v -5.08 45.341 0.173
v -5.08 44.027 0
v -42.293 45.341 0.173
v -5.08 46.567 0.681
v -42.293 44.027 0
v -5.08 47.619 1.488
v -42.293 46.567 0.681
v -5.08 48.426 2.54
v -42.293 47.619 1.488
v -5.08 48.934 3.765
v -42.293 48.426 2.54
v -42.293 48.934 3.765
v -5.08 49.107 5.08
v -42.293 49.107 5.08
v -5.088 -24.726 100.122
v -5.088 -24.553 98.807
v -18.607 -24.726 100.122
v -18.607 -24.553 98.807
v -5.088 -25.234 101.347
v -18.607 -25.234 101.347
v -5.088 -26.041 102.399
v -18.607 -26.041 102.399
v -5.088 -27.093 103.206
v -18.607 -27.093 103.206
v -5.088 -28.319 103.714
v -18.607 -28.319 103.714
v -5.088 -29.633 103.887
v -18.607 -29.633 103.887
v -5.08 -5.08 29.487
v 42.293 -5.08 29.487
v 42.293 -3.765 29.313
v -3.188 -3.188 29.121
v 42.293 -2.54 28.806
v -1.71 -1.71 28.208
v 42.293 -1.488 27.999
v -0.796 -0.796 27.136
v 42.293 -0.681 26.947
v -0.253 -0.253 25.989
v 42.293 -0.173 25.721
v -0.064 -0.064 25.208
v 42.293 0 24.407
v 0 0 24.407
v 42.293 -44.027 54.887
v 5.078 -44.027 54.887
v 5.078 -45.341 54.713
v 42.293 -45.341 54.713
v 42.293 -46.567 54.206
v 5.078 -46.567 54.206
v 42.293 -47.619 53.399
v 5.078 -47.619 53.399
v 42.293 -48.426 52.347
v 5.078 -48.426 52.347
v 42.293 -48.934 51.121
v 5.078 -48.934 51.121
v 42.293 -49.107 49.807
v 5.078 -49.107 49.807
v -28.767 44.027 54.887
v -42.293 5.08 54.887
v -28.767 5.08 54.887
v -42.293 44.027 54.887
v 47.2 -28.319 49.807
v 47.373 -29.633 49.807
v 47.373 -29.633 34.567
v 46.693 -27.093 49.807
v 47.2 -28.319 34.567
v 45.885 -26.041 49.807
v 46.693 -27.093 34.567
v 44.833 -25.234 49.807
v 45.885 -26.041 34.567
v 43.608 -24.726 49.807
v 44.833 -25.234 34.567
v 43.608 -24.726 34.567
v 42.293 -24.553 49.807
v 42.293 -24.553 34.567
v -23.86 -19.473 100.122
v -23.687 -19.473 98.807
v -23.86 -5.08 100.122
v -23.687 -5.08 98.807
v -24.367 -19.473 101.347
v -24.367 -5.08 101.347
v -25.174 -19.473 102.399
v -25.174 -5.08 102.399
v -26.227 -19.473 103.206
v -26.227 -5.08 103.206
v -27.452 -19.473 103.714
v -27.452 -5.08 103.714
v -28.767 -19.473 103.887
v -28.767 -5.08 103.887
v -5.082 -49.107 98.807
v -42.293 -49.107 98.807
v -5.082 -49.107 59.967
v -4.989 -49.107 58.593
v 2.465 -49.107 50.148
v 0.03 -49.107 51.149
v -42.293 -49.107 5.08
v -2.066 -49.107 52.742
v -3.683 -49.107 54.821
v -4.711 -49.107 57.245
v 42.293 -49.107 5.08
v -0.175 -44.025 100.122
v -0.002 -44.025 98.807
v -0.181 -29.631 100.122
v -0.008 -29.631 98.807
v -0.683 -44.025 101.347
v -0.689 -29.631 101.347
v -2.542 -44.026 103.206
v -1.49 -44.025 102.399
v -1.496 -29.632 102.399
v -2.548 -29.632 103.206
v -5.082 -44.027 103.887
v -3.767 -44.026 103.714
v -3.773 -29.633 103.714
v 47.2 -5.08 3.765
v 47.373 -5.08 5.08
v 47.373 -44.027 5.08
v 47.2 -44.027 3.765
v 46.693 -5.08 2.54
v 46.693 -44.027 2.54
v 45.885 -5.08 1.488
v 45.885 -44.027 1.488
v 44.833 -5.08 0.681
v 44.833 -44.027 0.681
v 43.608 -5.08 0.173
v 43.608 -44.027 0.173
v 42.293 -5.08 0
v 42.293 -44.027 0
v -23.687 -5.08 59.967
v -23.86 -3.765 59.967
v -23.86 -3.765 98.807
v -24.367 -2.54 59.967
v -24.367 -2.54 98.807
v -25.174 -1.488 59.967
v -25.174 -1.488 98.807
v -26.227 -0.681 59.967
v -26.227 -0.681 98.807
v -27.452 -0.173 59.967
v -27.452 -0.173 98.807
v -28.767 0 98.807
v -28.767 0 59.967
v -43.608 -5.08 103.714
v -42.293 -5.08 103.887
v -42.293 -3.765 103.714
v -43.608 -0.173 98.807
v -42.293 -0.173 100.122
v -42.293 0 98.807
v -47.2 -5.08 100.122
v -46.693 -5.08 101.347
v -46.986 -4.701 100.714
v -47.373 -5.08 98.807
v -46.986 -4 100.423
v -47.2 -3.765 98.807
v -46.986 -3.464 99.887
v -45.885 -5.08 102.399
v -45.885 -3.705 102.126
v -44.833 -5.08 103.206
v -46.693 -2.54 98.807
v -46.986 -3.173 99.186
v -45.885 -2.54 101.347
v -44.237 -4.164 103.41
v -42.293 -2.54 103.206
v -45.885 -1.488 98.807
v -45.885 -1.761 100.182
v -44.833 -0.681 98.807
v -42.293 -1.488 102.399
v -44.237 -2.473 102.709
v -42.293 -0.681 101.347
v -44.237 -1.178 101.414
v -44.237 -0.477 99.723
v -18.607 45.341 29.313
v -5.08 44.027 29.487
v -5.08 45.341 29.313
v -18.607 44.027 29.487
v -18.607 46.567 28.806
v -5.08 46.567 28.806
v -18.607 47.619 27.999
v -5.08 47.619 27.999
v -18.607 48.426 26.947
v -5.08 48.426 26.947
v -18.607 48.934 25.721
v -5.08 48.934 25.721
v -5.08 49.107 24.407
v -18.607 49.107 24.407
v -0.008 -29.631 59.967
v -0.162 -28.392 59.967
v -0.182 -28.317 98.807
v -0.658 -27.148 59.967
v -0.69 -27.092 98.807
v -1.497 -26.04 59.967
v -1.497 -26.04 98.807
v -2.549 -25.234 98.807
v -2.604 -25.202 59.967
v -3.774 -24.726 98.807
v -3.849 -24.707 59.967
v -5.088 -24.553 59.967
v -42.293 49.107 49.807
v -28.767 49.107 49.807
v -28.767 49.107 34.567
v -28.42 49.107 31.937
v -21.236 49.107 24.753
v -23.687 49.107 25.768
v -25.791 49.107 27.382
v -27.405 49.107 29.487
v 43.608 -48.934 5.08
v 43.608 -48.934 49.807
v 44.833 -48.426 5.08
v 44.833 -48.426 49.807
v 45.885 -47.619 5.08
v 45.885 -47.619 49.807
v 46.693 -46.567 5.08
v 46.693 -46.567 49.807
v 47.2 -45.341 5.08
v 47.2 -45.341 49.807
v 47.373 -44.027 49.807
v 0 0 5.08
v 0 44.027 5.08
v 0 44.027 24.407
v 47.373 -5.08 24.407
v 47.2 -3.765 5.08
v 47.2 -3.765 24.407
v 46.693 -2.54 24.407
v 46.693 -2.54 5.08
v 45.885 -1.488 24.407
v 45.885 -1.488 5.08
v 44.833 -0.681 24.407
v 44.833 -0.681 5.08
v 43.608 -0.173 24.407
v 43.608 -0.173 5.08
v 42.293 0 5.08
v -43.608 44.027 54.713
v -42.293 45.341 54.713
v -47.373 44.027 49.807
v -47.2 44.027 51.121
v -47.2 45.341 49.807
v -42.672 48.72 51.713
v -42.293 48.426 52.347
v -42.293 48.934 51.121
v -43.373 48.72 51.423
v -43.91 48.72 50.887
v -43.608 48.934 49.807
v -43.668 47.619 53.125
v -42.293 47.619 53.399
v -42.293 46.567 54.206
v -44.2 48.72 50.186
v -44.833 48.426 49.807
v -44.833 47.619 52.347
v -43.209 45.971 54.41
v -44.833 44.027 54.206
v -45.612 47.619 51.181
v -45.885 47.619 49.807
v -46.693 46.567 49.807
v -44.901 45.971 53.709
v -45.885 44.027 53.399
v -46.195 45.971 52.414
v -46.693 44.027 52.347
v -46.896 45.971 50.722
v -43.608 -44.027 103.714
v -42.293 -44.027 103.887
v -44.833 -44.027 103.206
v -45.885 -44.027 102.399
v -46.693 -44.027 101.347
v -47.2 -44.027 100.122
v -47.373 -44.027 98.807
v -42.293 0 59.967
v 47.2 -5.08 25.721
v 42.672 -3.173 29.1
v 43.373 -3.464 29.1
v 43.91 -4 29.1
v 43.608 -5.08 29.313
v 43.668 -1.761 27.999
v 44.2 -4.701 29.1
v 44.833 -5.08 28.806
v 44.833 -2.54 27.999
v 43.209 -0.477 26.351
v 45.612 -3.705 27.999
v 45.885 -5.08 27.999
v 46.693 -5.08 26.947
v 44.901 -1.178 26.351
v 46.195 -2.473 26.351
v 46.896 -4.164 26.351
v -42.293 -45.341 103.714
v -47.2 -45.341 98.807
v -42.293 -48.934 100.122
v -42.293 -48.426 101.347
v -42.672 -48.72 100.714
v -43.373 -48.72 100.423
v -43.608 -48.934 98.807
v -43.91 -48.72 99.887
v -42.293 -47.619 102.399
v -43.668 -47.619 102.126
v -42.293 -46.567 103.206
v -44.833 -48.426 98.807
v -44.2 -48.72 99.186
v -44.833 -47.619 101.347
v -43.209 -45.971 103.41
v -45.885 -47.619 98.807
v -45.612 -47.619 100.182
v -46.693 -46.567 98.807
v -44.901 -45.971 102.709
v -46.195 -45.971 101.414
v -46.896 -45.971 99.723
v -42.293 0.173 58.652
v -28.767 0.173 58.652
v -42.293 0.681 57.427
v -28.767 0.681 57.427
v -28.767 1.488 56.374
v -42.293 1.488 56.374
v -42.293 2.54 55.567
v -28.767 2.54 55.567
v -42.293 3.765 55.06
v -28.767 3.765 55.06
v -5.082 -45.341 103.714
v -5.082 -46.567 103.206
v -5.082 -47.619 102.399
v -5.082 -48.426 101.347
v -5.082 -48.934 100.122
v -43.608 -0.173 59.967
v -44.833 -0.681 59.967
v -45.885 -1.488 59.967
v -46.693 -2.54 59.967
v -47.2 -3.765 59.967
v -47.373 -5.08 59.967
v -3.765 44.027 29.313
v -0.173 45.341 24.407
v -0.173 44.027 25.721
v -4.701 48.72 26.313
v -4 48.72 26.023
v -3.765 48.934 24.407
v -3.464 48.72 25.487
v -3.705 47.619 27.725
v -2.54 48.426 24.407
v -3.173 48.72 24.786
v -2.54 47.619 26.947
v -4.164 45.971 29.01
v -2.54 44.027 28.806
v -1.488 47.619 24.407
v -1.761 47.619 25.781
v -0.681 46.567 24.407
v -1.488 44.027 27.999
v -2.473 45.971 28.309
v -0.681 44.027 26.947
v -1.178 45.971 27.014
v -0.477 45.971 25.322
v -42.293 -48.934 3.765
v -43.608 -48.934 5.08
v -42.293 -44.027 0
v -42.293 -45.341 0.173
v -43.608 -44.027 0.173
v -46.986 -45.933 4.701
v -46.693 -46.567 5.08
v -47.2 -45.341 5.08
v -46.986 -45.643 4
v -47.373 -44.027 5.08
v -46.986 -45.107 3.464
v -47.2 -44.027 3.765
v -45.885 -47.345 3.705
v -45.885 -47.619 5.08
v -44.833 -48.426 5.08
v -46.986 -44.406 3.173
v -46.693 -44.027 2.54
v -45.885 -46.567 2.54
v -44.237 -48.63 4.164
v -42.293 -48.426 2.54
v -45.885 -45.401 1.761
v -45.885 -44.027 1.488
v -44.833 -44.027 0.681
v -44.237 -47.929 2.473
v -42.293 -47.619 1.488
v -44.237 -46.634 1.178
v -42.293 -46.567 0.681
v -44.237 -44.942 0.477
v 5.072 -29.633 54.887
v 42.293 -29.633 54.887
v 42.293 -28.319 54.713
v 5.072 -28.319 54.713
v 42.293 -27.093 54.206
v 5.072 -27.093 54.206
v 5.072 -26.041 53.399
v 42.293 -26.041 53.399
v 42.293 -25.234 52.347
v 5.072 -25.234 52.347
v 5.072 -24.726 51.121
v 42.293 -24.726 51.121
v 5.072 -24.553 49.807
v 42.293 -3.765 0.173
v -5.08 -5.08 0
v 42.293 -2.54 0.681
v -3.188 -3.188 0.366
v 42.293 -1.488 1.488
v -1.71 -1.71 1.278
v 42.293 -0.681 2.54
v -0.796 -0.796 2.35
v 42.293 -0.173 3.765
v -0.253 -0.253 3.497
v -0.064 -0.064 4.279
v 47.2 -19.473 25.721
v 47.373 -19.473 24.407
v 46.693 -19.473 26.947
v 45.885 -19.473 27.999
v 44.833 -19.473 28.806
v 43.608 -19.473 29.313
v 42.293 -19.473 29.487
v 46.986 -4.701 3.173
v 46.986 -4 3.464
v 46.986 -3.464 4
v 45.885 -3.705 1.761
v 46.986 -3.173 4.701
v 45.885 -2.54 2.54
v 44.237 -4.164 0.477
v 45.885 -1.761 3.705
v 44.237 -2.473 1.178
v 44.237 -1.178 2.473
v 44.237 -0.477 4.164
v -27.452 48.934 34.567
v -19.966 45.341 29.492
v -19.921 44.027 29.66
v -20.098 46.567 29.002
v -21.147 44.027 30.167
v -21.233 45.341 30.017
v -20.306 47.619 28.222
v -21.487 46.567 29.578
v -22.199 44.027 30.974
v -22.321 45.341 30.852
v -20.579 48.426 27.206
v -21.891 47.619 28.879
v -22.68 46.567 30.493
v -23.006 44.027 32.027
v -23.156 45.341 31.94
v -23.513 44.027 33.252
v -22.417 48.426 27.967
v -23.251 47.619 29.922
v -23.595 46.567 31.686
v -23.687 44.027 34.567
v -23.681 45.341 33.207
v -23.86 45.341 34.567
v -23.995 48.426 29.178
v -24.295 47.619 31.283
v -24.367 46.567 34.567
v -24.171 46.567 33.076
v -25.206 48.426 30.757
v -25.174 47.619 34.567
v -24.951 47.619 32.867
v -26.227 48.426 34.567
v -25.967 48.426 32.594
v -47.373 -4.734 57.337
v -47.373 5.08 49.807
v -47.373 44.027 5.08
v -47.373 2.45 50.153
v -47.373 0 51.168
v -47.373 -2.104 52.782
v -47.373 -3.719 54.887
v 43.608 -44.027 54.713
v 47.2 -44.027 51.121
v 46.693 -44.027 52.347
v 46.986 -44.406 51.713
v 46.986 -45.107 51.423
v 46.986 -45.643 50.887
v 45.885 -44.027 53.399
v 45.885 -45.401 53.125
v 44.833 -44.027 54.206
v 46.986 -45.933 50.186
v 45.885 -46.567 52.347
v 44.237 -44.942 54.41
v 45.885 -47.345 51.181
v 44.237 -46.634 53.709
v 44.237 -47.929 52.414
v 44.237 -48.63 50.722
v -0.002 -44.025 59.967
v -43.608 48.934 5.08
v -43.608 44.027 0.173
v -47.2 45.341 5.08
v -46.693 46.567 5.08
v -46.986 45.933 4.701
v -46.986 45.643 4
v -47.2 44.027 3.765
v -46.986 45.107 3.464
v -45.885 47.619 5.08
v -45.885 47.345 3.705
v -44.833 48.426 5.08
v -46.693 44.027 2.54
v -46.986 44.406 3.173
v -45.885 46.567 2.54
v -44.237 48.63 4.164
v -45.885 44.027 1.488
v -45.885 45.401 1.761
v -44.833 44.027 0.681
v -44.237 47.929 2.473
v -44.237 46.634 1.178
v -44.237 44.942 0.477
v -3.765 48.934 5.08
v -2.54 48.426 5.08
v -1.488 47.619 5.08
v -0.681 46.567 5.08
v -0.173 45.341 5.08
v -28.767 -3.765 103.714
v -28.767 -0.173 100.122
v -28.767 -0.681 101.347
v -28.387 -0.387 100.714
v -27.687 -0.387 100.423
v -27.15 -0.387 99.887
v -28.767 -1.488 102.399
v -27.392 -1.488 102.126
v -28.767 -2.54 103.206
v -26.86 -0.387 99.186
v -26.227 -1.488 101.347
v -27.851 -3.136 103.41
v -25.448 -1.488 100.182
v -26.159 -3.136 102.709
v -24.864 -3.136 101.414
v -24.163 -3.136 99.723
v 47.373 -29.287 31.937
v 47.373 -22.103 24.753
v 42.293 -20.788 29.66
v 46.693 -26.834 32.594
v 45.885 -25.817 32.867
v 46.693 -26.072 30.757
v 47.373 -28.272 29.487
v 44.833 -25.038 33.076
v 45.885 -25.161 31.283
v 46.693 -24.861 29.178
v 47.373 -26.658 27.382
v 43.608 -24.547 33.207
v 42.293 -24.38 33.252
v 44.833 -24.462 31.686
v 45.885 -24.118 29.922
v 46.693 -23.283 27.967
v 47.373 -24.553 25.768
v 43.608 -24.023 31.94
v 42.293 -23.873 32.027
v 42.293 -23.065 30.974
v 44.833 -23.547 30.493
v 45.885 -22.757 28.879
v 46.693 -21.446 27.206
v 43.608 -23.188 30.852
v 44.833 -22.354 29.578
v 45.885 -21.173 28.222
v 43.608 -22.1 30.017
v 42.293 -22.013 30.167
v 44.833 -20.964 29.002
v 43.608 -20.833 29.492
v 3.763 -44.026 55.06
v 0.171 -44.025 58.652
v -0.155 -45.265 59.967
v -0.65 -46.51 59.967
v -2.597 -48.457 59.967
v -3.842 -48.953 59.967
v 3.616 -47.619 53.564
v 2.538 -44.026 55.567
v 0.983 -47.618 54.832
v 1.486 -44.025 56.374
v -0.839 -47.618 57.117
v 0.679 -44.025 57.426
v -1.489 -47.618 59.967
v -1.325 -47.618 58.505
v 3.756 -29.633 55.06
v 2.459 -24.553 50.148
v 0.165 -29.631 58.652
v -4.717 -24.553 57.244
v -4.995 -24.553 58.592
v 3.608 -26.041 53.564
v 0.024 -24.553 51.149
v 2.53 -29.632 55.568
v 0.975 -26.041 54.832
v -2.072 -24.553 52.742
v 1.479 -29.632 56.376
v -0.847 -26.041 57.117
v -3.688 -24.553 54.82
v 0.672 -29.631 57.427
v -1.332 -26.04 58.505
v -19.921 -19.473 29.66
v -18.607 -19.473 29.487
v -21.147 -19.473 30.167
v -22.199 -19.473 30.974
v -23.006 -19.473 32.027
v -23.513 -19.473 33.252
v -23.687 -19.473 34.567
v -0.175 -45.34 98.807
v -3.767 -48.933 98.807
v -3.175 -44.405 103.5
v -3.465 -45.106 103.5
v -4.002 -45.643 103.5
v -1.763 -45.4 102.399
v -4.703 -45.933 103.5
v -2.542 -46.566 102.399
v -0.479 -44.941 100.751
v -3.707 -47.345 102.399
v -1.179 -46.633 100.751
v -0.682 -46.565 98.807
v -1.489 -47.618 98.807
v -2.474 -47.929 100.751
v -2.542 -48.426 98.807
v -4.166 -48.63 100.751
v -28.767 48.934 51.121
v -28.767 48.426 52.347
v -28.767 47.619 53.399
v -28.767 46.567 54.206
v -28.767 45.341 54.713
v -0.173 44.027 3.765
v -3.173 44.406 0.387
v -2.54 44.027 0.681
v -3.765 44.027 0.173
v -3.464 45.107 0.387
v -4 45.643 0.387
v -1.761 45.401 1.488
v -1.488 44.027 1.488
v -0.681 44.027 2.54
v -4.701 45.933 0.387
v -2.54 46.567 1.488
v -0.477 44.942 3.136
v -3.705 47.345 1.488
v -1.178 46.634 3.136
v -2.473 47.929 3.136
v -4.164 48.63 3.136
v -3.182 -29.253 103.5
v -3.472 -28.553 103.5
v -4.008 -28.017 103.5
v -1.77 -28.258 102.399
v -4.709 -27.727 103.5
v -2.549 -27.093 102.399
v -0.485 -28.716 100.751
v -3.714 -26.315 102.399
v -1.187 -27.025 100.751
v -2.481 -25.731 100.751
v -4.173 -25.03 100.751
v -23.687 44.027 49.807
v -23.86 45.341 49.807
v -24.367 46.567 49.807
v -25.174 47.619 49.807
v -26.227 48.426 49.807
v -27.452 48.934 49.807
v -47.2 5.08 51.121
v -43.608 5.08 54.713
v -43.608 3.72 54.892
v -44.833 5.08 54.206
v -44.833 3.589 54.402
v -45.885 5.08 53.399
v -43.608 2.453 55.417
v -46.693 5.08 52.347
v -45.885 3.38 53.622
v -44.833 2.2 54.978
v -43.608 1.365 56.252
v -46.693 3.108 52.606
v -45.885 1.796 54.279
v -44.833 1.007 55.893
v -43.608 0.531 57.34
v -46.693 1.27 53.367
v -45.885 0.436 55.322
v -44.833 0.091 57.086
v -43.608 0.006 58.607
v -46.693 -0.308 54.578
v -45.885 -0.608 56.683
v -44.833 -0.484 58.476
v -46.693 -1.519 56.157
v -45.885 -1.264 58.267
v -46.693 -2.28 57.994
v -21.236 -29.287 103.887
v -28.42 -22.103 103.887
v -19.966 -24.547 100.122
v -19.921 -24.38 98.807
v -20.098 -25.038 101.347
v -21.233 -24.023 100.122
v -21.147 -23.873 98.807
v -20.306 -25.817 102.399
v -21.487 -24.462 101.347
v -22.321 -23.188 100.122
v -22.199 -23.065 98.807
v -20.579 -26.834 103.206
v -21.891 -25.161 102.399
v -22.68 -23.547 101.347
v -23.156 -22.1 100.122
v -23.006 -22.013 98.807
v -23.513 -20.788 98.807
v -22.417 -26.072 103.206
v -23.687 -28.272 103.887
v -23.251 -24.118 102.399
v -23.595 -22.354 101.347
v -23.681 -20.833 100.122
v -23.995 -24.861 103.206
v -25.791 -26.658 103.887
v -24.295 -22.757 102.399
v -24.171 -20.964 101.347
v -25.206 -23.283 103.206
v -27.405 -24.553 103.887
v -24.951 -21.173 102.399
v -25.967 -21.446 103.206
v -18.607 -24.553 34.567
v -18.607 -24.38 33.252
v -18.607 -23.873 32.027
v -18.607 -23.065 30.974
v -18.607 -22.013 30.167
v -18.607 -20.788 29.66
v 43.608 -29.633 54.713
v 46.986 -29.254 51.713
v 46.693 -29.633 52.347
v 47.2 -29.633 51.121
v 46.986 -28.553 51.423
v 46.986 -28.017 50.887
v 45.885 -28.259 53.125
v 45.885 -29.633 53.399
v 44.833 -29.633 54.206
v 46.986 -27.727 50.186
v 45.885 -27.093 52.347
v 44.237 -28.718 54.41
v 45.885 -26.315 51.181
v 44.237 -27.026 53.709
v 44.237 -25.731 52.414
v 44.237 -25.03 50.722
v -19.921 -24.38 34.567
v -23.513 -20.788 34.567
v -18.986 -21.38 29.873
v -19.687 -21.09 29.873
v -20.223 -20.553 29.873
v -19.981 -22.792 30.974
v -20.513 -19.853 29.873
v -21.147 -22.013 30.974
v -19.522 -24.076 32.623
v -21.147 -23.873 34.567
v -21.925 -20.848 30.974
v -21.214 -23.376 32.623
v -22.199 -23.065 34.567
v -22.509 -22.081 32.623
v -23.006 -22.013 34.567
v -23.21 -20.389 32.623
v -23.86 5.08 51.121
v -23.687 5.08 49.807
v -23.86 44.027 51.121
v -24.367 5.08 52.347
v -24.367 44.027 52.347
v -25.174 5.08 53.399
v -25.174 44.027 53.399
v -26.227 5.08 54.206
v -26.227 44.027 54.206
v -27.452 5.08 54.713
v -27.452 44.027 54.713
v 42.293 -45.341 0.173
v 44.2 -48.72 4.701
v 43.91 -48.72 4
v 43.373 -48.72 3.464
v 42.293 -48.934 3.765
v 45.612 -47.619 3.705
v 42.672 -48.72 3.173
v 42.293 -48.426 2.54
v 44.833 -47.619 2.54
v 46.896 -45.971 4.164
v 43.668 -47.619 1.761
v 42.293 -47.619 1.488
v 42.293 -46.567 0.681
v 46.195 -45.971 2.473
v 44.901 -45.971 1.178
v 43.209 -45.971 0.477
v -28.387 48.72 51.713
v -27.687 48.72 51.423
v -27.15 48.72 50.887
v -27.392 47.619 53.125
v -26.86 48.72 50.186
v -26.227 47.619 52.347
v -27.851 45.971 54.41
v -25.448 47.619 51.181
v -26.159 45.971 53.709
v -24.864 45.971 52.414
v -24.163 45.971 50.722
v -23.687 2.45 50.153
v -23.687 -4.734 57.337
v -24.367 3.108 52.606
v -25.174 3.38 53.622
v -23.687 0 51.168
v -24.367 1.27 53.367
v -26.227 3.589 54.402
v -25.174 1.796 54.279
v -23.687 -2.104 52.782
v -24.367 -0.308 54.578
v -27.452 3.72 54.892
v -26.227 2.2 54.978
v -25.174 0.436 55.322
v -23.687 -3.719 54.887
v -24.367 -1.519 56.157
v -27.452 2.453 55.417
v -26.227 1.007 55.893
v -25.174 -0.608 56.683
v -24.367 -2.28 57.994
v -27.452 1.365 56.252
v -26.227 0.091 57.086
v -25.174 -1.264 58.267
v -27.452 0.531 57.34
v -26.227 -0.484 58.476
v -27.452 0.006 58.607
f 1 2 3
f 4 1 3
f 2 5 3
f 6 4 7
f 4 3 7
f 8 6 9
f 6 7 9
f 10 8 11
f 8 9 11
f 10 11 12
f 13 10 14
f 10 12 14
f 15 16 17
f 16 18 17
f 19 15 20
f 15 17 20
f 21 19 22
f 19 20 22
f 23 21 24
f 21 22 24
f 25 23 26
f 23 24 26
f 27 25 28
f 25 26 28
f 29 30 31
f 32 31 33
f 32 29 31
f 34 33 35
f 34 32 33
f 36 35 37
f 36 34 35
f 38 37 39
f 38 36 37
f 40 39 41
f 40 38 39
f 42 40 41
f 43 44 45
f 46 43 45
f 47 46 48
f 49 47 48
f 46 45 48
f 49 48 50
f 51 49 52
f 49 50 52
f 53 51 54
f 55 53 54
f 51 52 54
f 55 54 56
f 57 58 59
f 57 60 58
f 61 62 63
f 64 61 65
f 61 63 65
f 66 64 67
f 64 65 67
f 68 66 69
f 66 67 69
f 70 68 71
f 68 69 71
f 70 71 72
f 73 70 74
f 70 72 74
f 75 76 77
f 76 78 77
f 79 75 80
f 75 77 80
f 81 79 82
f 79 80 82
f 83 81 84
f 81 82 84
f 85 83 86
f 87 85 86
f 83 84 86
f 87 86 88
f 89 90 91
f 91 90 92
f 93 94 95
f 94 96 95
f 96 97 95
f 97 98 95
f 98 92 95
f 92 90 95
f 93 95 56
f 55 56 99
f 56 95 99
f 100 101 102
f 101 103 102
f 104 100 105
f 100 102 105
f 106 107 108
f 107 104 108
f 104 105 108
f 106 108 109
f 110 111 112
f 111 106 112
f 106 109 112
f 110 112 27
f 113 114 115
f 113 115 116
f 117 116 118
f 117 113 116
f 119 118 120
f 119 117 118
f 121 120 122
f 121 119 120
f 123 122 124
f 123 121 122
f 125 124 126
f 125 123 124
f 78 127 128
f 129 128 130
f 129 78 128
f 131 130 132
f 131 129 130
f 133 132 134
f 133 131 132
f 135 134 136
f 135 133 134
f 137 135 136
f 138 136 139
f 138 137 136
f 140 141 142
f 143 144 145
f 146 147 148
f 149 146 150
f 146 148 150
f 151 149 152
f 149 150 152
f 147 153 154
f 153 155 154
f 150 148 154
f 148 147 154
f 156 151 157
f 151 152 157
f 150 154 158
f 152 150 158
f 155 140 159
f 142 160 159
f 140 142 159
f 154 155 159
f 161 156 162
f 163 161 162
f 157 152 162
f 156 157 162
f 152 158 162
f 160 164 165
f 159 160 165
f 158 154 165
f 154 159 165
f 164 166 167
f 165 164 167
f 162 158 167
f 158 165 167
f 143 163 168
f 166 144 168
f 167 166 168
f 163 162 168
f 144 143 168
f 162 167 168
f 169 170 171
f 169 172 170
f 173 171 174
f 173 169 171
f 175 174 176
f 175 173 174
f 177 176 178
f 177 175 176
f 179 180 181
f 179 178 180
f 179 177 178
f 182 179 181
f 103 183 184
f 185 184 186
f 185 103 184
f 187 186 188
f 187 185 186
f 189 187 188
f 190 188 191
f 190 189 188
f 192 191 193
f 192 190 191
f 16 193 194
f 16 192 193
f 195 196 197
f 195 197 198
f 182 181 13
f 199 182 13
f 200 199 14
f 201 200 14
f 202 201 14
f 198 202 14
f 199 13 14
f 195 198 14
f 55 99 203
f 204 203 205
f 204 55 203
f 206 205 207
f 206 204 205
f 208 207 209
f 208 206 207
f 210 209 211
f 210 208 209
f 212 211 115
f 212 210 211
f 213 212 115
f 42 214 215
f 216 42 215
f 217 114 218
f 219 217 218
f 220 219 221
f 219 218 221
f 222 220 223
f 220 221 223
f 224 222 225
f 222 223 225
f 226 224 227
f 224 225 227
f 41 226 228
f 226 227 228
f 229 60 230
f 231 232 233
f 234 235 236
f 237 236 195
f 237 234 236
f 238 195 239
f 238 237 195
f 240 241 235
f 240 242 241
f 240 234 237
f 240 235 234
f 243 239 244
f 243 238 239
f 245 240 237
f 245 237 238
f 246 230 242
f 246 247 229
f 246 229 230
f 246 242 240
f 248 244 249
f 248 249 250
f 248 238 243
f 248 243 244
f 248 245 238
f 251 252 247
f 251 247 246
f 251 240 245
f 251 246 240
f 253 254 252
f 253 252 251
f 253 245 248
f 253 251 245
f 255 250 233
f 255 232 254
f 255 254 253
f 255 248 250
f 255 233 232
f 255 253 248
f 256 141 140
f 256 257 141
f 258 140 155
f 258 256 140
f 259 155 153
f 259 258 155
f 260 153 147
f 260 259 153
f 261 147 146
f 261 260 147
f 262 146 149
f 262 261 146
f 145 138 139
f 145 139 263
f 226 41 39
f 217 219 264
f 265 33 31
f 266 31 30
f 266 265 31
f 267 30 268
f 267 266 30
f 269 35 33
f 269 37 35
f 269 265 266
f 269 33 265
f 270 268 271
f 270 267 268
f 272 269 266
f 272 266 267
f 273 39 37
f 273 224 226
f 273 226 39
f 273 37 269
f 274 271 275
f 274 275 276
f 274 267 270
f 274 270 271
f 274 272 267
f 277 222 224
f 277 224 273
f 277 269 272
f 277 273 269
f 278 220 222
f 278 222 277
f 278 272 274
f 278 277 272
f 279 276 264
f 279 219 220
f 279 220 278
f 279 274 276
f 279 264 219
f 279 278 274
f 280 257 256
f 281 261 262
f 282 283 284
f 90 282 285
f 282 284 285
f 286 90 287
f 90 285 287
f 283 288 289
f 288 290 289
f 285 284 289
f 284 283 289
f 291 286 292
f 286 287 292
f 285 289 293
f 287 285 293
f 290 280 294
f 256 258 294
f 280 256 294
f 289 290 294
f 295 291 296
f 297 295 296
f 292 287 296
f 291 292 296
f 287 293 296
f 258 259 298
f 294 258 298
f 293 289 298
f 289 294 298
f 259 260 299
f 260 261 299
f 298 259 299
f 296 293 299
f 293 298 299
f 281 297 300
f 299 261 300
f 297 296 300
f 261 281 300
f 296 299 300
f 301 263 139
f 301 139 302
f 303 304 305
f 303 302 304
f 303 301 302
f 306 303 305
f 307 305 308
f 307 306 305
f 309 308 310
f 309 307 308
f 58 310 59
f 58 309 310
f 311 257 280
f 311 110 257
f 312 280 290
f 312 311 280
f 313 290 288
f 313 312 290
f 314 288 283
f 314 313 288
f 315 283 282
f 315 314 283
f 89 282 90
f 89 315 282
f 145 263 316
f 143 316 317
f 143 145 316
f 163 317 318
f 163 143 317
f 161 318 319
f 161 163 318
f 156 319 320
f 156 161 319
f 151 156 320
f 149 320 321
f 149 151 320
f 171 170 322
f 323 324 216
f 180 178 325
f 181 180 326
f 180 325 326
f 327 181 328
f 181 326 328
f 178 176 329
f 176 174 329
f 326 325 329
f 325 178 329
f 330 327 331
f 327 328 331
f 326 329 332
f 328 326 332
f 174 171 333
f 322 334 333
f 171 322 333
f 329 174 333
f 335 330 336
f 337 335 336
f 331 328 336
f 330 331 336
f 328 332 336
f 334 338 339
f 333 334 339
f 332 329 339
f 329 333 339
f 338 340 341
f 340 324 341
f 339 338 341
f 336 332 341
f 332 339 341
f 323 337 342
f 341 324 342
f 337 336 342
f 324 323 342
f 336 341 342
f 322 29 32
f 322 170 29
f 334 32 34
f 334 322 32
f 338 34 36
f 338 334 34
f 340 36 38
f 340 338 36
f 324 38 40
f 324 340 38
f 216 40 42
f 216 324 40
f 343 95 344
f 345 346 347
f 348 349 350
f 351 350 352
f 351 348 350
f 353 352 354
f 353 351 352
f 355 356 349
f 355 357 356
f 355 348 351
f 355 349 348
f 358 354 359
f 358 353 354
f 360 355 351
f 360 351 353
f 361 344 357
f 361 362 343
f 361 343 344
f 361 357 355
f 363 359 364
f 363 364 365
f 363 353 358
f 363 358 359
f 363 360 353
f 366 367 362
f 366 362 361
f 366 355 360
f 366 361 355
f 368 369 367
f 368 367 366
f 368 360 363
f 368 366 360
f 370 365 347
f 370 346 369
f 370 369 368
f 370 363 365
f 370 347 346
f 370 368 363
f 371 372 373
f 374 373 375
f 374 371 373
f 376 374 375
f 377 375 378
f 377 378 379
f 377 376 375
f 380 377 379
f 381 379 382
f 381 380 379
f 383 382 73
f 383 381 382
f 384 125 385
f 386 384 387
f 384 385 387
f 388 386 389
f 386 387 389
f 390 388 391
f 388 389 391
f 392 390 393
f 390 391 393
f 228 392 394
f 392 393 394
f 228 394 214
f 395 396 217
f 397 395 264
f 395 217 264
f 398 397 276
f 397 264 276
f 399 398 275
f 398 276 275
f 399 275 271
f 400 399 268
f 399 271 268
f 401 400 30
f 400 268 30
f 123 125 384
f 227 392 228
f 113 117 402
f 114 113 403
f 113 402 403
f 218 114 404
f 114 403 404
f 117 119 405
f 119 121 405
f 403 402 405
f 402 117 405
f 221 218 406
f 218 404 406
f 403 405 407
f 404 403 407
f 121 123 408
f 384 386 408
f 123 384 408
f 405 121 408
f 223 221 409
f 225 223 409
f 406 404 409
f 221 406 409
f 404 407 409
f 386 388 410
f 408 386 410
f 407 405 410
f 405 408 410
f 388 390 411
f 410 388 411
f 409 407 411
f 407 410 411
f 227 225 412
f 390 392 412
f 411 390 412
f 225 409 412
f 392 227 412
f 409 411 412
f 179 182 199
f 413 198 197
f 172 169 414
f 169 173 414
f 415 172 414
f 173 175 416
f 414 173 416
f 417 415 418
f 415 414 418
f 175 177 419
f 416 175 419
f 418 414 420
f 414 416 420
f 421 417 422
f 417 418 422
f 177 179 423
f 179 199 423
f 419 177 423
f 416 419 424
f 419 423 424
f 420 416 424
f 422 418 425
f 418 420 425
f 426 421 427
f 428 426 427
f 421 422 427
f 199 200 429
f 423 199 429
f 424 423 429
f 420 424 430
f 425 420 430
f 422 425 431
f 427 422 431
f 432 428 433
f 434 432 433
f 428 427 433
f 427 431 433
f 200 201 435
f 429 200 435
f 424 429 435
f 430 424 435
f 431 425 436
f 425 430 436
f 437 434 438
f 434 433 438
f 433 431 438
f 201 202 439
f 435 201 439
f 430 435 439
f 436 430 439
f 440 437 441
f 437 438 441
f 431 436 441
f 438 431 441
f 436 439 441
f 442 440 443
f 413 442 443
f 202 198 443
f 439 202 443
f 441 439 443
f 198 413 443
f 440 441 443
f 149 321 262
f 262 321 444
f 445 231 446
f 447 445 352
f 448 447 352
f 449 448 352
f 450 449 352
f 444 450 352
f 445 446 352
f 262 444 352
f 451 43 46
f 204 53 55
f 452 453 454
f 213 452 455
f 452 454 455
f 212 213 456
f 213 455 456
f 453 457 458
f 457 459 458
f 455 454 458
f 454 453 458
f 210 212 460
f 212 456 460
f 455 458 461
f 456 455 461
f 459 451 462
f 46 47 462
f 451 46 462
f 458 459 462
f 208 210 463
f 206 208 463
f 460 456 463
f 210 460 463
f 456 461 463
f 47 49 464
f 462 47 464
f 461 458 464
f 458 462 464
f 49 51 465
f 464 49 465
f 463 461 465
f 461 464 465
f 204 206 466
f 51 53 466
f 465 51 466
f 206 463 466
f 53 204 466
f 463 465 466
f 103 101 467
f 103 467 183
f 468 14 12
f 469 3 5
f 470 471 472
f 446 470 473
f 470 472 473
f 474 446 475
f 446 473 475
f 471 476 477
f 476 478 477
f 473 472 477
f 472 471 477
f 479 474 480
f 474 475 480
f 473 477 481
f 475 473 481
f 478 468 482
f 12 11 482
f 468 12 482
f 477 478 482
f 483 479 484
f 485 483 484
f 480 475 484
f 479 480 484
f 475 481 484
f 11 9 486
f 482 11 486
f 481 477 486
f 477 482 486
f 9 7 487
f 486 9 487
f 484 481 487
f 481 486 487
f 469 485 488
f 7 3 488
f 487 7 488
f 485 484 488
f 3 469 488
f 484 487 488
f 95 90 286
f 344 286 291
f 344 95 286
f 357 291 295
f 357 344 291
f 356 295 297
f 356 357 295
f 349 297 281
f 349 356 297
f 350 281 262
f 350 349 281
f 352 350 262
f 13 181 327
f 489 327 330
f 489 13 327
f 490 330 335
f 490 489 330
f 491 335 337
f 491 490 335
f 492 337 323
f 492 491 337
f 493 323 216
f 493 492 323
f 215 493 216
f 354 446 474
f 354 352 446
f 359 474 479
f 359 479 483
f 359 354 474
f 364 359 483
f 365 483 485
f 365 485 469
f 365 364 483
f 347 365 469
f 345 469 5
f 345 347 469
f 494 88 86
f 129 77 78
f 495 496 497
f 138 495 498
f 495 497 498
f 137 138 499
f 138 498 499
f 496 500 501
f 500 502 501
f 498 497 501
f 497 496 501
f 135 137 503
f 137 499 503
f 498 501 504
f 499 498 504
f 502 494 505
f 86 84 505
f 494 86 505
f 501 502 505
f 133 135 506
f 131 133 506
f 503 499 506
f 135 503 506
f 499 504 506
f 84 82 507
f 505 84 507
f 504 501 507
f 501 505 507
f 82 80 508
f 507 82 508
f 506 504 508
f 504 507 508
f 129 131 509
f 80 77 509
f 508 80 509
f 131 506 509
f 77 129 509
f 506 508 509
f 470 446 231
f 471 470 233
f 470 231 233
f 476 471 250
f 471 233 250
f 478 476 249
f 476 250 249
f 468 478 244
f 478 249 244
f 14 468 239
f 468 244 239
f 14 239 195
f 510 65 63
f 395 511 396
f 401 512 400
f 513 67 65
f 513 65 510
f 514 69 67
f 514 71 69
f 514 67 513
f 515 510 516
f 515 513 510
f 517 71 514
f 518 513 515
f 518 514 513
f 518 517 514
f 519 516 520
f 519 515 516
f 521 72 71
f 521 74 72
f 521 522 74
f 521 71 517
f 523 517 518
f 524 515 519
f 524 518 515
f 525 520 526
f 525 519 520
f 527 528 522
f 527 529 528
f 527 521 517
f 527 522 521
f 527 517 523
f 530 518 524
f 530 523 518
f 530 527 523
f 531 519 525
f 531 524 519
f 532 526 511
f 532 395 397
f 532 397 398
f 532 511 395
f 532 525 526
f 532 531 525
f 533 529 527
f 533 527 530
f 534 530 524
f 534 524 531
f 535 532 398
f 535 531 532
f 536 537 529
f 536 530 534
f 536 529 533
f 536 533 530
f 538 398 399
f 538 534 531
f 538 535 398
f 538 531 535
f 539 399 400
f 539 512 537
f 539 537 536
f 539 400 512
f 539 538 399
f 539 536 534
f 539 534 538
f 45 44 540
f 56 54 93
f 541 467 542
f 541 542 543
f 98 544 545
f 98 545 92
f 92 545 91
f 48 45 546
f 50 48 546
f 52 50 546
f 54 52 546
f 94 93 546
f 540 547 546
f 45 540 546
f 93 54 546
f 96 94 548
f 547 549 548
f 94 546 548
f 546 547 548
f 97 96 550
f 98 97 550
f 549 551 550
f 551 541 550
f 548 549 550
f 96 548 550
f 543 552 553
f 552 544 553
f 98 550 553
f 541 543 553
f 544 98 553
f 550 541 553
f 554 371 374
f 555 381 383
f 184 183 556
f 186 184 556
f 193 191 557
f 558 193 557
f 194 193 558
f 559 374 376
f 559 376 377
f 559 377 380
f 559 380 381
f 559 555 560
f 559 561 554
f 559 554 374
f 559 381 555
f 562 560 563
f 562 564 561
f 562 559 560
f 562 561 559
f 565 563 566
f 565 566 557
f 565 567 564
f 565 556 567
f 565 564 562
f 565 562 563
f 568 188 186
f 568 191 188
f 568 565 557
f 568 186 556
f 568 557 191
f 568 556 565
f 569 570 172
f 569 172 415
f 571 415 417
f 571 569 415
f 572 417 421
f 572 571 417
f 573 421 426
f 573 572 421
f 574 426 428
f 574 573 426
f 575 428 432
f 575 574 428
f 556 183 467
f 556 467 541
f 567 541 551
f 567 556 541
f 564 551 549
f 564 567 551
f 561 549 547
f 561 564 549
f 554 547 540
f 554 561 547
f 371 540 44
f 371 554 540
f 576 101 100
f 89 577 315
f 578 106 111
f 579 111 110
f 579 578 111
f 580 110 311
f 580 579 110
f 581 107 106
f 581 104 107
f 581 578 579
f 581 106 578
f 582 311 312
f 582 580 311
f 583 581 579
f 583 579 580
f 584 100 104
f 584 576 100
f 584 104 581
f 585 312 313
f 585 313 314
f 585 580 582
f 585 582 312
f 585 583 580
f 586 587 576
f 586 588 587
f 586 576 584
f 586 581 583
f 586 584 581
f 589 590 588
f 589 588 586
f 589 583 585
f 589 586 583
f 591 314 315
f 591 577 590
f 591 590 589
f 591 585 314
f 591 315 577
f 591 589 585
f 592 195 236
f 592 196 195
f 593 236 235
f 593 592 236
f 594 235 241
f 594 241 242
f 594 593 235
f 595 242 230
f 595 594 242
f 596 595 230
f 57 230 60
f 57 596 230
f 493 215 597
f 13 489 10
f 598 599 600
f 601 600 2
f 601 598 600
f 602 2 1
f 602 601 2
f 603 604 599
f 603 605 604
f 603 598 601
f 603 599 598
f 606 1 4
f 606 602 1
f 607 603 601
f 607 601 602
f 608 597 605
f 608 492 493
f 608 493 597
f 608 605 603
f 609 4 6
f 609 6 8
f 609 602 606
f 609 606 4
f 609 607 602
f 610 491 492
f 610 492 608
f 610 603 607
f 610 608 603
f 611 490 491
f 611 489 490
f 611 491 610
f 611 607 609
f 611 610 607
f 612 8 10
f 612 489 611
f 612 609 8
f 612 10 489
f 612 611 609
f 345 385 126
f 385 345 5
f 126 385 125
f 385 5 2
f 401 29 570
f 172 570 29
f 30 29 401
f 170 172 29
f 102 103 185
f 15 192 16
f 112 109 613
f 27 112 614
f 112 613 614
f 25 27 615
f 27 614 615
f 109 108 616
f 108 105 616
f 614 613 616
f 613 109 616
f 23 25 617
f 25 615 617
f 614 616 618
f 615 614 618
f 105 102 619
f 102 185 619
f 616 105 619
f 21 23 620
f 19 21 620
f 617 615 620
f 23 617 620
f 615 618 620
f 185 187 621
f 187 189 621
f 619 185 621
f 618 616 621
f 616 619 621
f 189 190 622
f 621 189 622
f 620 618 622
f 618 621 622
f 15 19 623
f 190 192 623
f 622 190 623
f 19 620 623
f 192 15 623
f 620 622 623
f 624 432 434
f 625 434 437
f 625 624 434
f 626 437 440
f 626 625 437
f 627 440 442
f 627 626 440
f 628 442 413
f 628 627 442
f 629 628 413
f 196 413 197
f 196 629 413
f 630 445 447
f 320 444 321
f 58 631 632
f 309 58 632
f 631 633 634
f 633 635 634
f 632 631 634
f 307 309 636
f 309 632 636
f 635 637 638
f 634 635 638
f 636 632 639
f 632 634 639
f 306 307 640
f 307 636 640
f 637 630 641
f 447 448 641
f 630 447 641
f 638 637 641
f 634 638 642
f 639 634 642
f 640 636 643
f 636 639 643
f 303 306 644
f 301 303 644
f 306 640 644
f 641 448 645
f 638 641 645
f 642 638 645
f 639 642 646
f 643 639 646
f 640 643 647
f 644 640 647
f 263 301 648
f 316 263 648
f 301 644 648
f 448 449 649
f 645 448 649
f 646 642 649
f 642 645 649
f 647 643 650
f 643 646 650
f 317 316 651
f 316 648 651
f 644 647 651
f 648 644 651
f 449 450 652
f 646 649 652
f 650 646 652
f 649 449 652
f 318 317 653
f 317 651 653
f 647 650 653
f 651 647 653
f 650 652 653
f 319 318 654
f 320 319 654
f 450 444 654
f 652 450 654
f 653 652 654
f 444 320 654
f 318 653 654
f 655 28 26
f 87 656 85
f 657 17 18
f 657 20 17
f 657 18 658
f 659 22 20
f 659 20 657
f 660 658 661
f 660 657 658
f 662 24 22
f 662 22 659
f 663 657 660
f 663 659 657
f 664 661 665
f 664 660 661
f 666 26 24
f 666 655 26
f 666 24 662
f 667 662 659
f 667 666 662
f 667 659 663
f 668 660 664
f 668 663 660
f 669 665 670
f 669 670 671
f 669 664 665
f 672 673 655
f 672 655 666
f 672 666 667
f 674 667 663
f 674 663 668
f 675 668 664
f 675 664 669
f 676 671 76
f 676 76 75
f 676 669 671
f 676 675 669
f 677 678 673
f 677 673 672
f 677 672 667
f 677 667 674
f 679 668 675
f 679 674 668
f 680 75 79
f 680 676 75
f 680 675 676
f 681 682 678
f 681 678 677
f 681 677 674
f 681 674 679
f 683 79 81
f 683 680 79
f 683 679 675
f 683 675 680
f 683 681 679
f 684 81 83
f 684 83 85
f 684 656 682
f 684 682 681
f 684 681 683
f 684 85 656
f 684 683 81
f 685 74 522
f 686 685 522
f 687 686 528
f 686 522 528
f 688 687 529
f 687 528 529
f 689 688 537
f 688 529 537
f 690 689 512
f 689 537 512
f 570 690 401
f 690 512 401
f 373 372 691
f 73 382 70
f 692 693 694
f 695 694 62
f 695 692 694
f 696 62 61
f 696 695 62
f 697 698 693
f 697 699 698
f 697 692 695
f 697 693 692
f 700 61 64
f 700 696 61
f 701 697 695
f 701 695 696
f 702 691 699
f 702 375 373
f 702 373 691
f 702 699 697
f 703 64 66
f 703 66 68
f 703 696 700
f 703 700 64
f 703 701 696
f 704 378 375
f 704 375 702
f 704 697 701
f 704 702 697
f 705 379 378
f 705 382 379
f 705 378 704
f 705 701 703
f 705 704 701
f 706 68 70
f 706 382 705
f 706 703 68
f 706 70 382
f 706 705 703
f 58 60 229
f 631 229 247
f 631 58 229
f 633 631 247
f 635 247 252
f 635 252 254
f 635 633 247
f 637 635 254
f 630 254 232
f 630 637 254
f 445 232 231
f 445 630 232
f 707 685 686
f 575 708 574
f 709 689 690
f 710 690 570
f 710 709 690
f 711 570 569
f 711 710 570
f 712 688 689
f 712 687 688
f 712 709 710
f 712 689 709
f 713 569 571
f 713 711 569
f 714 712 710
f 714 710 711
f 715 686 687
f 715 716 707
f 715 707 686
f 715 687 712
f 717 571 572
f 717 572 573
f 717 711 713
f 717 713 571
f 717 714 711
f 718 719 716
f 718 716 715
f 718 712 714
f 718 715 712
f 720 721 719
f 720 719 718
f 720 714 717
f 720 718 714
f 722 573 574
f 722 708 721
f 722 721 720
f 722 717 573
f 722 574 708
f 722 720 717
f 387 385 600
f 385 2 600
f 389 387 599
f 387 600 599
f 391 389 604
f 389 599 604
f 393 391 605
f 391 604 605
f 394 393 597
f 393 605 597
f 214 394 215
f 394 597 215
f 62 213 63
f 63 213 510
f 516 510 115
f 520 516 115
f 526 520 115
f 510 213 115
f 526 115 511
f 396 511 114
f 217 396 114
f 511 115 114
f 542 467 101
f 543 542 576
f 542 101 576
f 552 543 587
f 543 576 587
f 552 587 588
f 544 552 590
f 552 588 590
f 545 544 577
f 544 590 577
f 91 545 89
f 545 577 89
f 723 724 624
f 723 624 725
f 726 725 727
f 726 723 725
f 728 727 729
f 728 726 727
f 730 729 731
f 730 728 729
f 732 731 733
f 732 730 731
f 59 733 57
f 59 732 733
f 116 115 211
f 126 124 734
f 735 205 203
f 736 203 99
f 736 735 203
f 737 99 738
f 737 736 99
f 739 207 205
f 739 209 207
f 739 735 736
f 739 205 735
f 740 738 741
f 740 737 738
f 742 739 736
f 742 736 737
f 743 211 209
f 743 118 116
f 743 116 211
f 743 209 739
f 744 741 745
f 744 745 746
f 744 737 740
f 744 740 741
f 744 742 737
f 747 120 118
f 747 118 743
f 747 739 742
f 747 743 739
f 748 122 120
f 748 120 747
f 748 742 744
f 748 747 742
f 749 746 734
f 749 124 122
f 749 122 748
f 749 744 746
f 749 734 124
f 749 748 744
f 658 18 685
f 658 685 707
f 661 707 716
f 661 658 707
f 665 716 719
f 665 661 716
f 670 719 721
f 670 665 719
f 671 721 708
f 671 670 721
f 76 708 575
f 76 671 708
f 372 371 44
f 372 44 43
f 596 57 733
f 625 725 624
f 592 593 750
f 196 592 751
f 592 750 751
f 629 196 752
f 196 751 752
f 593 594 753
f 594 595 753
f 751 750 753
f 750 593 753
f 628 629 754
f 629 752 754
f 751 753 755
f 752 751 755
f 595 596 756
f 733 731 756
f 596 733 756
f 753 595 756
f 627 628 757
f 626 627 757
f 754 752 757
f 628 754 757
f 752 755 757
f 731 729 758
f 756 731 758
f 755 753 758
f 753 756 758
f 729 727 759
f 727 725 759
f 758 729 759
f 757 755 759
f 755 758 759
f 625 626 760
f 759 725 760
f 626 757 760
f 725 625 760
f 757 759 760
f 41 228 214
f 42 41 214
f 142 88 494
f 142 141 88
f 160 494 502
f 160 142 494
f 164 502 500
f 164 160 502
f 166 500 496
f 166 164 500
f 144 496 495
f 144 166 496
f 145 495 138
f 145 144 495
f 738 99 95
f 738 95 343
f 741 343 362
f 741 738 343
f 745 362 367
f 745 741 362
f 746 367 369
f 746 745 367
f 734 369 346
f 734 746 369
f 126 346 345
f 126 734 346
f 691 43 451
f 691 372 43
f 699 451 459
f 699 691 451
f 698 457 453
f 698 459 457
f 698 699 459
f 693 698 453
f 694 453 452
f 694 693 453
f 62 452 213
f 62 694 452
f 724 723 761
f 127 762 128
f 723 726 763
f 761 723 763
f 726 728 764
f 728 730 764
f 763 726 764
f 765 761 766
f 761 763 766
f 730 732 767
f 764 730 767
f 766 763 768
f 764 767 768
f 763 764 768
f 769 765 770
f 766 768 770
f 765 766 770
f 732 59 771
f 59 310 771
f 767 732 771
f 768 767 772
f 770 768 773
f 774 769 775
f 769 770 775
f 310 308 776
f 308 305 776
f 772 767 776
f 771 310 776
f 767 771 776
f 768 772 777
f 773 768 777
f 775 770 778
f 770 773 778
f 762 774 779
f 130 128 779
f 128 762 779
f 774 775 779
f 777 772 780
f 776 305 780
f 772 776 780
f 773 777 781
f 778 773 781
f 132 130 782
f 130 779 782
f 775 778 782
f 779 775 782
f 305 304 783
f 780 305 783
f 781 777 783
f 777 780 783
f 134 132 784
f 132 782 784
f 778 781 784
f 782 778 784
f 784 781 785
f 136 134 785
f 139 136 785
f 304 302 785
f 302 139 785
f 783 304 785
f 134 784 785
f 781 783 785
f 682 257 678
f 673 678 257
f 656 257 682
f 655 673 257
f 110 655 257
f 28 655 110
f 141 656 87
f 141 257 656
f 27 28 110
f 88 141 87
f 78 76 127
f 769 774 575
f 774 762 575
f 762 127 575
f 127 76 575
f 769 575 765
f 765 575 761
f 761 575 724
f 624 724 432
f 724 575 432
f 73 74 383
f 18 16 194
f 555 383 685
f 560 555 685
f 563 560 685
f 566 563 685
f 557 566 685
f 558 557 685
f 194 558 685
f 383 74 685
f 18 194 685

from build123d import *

# Parameters (mm, degrees)
F8_DEPTH  = 54.8865515739
F1_DEPTH  = 36.7471762002
F3_DEPTH  = 25.4
F10_DEPTH = 62.1797274798
F4_DEPTH  = 13.1793599576
F5_F1_R   = 5.08
F5_F2_R   = 5.08


with BuildPart() as f8:
    # F6 (on Top) → F8 (new body)
    with BuildSketch(Plane.XY):
        Polygon((-47.3731532693, 49.1066724062), (-47.3731532693, -49.1066724062), (47.3731532693, -49.1066724062), (47.3731532693, 0), (0, 0), (0, 49.1066724062), align=None)
    extrude(amount=F8_DEPTH)

    # F0 (on face) → F1 (join)
    with BuildSketch(Plane.XY.offset(54.8865515739)):
        Polygon((0, 49.1066724062), (-23.6865766346, 49.1066724062), (-23.6865766346, -24.5533362031), (47.3731532693, -24.5533362031), (47.3731532693, 0), (0, 0), align=None)
    extrude(amount=-F1_DEPTH)

    # F2 (on face) → F3 (cut)
    with BuildSketch(Plane.XY.offset(54.8865515739)):
        Polygon((-23.6865766346, -24.5533362031), (47.3731532693, -24.5533362031), (47.3731532693, 0), (0, 0), (0, 49.1066724062), (-23.6865766346, 49.1066724062), align=None)
    extrude(amount=-F3_DEPTH, mode=Mode.SUBTRACT)

    # F9 (on face) → F10 (join)
    with BuildSketch(Plane.XY.offset(54.8865515739)):
        Polygon((0, -49.1066724062), (-0.0103376806, -24.5533362031), (-23.6865766346, -24.5533362031), (-23.6865766346, -19.0210193396), (-23.6865766346, 0), (-47.3731532693, 0), (-47.3731532693, -11.8761584163), (-47.3731532693, -49.1066724062), align=None)
    extrude(amount=F10_DEPTH)

    # F4 (cut): a face of the model
    f4_faces = [f8.faces().sort_by_distance(p)[0] for p in [
        (-27.6363494072, -28.6452612162, 117.0662790537),
    ]]
    extrude(f4_faces, amount=-F4_DEPTH, mode=Mode.SUBTRACT)

    # F5: fillet of radius 5.08 on 32 edges, made by hand

    # F5_f1
    f5_f1_edges = [f8.edges().sort_by_distance(p)[0] for p in [
        (-23.6865766346, -24.5533362031, 66.686735335),
        (-35.529864952, 0, 54.8865515739),
        (-0.0051688403, -36.8300043046, 54.8865515739),
        (11.8432883173, -24.5533362031, 29.4865515739),
        (-23.6865766346, 12.2766681015, 29.4865515739),
    ]]
    fillet(f5_f1_edges, radius=F5_F1_R)

    # F5_f2
    f5_f2_edges = [f8.edges().sort_by_distance(p)[0] for p in [
        (-0.0051688403, -36.8300043046, 103.8869190961),
        (-9.3084571576, -24.5533362031, 103.8869190961),
        (-23.6865766346, -9.7366681015, 103.8869190961),
        (-35.529864952, 0, 103.8869190961),
        (-47.3731532693, -24.5533362031, 103.8869190961),
        (-23.6865766346, -49.1066724062, 103.8869190961),
        (-0.0103376806, -24.5533362031, 81.926735335),
        (0, -49.1066724062, 81.926735335),
        (-23.6865766346, 0, 81.926735335),
        (-47.3731532693, 0, 81.926735335),
        (47.3731532693, -36.8300043046, 54.8865515739),
        (-35.529864952, 49.1066724062, 54.8865515739),
        (23.6865766346, 0, 0),
        (47.3731532693, -24.5533362031, 0),
        (47.3731532693, 0, 14.7432757869),
        (23.6865766346, 0, 29.4865515739),
        (47.3731532693, -9.7366681015, 29.4865515739),
        (0, 24.5533362031, 29.4865515739),
        (-9.3032883173, 49.1066724062, 29.4865515739),
        (0, 49.1066724062, 14.7432757869),
        (0, 24.5533362031, 0),
        (47.3731532693, -49.1066724062, 27.4432757869),
        (0, -49.1066724062, 0),
        (-47.3731532693, -49.1066724062, 51.9434595481),
        (-23.6865766346, 49.1066724062, 0),
        (-47.3731532693, 49.1066724062, 27.4432757869),
        (-47.3731532693, 0, 0),
        (-22.1986790831, 49.1066724062, 30.9744491254),
        (47.3731532693, -23.0654386515, 30.9744491254),
        (-47.3731532693, 1.4878975516, 56.3744491254),
        (-23.6865766346, 1.4878975516, 56.3744491254),
        (1.4878976834, -49.1066724062, 56.3744491254),
        (1.4775600029, -24.5533362031, 56.3744491254),
        (-22.1986790831, -23.0654386515, 103.8869190961),
    ]]
    fillet(f5_f2_edges, radius=F5_F2_R)


solid = f8.part
